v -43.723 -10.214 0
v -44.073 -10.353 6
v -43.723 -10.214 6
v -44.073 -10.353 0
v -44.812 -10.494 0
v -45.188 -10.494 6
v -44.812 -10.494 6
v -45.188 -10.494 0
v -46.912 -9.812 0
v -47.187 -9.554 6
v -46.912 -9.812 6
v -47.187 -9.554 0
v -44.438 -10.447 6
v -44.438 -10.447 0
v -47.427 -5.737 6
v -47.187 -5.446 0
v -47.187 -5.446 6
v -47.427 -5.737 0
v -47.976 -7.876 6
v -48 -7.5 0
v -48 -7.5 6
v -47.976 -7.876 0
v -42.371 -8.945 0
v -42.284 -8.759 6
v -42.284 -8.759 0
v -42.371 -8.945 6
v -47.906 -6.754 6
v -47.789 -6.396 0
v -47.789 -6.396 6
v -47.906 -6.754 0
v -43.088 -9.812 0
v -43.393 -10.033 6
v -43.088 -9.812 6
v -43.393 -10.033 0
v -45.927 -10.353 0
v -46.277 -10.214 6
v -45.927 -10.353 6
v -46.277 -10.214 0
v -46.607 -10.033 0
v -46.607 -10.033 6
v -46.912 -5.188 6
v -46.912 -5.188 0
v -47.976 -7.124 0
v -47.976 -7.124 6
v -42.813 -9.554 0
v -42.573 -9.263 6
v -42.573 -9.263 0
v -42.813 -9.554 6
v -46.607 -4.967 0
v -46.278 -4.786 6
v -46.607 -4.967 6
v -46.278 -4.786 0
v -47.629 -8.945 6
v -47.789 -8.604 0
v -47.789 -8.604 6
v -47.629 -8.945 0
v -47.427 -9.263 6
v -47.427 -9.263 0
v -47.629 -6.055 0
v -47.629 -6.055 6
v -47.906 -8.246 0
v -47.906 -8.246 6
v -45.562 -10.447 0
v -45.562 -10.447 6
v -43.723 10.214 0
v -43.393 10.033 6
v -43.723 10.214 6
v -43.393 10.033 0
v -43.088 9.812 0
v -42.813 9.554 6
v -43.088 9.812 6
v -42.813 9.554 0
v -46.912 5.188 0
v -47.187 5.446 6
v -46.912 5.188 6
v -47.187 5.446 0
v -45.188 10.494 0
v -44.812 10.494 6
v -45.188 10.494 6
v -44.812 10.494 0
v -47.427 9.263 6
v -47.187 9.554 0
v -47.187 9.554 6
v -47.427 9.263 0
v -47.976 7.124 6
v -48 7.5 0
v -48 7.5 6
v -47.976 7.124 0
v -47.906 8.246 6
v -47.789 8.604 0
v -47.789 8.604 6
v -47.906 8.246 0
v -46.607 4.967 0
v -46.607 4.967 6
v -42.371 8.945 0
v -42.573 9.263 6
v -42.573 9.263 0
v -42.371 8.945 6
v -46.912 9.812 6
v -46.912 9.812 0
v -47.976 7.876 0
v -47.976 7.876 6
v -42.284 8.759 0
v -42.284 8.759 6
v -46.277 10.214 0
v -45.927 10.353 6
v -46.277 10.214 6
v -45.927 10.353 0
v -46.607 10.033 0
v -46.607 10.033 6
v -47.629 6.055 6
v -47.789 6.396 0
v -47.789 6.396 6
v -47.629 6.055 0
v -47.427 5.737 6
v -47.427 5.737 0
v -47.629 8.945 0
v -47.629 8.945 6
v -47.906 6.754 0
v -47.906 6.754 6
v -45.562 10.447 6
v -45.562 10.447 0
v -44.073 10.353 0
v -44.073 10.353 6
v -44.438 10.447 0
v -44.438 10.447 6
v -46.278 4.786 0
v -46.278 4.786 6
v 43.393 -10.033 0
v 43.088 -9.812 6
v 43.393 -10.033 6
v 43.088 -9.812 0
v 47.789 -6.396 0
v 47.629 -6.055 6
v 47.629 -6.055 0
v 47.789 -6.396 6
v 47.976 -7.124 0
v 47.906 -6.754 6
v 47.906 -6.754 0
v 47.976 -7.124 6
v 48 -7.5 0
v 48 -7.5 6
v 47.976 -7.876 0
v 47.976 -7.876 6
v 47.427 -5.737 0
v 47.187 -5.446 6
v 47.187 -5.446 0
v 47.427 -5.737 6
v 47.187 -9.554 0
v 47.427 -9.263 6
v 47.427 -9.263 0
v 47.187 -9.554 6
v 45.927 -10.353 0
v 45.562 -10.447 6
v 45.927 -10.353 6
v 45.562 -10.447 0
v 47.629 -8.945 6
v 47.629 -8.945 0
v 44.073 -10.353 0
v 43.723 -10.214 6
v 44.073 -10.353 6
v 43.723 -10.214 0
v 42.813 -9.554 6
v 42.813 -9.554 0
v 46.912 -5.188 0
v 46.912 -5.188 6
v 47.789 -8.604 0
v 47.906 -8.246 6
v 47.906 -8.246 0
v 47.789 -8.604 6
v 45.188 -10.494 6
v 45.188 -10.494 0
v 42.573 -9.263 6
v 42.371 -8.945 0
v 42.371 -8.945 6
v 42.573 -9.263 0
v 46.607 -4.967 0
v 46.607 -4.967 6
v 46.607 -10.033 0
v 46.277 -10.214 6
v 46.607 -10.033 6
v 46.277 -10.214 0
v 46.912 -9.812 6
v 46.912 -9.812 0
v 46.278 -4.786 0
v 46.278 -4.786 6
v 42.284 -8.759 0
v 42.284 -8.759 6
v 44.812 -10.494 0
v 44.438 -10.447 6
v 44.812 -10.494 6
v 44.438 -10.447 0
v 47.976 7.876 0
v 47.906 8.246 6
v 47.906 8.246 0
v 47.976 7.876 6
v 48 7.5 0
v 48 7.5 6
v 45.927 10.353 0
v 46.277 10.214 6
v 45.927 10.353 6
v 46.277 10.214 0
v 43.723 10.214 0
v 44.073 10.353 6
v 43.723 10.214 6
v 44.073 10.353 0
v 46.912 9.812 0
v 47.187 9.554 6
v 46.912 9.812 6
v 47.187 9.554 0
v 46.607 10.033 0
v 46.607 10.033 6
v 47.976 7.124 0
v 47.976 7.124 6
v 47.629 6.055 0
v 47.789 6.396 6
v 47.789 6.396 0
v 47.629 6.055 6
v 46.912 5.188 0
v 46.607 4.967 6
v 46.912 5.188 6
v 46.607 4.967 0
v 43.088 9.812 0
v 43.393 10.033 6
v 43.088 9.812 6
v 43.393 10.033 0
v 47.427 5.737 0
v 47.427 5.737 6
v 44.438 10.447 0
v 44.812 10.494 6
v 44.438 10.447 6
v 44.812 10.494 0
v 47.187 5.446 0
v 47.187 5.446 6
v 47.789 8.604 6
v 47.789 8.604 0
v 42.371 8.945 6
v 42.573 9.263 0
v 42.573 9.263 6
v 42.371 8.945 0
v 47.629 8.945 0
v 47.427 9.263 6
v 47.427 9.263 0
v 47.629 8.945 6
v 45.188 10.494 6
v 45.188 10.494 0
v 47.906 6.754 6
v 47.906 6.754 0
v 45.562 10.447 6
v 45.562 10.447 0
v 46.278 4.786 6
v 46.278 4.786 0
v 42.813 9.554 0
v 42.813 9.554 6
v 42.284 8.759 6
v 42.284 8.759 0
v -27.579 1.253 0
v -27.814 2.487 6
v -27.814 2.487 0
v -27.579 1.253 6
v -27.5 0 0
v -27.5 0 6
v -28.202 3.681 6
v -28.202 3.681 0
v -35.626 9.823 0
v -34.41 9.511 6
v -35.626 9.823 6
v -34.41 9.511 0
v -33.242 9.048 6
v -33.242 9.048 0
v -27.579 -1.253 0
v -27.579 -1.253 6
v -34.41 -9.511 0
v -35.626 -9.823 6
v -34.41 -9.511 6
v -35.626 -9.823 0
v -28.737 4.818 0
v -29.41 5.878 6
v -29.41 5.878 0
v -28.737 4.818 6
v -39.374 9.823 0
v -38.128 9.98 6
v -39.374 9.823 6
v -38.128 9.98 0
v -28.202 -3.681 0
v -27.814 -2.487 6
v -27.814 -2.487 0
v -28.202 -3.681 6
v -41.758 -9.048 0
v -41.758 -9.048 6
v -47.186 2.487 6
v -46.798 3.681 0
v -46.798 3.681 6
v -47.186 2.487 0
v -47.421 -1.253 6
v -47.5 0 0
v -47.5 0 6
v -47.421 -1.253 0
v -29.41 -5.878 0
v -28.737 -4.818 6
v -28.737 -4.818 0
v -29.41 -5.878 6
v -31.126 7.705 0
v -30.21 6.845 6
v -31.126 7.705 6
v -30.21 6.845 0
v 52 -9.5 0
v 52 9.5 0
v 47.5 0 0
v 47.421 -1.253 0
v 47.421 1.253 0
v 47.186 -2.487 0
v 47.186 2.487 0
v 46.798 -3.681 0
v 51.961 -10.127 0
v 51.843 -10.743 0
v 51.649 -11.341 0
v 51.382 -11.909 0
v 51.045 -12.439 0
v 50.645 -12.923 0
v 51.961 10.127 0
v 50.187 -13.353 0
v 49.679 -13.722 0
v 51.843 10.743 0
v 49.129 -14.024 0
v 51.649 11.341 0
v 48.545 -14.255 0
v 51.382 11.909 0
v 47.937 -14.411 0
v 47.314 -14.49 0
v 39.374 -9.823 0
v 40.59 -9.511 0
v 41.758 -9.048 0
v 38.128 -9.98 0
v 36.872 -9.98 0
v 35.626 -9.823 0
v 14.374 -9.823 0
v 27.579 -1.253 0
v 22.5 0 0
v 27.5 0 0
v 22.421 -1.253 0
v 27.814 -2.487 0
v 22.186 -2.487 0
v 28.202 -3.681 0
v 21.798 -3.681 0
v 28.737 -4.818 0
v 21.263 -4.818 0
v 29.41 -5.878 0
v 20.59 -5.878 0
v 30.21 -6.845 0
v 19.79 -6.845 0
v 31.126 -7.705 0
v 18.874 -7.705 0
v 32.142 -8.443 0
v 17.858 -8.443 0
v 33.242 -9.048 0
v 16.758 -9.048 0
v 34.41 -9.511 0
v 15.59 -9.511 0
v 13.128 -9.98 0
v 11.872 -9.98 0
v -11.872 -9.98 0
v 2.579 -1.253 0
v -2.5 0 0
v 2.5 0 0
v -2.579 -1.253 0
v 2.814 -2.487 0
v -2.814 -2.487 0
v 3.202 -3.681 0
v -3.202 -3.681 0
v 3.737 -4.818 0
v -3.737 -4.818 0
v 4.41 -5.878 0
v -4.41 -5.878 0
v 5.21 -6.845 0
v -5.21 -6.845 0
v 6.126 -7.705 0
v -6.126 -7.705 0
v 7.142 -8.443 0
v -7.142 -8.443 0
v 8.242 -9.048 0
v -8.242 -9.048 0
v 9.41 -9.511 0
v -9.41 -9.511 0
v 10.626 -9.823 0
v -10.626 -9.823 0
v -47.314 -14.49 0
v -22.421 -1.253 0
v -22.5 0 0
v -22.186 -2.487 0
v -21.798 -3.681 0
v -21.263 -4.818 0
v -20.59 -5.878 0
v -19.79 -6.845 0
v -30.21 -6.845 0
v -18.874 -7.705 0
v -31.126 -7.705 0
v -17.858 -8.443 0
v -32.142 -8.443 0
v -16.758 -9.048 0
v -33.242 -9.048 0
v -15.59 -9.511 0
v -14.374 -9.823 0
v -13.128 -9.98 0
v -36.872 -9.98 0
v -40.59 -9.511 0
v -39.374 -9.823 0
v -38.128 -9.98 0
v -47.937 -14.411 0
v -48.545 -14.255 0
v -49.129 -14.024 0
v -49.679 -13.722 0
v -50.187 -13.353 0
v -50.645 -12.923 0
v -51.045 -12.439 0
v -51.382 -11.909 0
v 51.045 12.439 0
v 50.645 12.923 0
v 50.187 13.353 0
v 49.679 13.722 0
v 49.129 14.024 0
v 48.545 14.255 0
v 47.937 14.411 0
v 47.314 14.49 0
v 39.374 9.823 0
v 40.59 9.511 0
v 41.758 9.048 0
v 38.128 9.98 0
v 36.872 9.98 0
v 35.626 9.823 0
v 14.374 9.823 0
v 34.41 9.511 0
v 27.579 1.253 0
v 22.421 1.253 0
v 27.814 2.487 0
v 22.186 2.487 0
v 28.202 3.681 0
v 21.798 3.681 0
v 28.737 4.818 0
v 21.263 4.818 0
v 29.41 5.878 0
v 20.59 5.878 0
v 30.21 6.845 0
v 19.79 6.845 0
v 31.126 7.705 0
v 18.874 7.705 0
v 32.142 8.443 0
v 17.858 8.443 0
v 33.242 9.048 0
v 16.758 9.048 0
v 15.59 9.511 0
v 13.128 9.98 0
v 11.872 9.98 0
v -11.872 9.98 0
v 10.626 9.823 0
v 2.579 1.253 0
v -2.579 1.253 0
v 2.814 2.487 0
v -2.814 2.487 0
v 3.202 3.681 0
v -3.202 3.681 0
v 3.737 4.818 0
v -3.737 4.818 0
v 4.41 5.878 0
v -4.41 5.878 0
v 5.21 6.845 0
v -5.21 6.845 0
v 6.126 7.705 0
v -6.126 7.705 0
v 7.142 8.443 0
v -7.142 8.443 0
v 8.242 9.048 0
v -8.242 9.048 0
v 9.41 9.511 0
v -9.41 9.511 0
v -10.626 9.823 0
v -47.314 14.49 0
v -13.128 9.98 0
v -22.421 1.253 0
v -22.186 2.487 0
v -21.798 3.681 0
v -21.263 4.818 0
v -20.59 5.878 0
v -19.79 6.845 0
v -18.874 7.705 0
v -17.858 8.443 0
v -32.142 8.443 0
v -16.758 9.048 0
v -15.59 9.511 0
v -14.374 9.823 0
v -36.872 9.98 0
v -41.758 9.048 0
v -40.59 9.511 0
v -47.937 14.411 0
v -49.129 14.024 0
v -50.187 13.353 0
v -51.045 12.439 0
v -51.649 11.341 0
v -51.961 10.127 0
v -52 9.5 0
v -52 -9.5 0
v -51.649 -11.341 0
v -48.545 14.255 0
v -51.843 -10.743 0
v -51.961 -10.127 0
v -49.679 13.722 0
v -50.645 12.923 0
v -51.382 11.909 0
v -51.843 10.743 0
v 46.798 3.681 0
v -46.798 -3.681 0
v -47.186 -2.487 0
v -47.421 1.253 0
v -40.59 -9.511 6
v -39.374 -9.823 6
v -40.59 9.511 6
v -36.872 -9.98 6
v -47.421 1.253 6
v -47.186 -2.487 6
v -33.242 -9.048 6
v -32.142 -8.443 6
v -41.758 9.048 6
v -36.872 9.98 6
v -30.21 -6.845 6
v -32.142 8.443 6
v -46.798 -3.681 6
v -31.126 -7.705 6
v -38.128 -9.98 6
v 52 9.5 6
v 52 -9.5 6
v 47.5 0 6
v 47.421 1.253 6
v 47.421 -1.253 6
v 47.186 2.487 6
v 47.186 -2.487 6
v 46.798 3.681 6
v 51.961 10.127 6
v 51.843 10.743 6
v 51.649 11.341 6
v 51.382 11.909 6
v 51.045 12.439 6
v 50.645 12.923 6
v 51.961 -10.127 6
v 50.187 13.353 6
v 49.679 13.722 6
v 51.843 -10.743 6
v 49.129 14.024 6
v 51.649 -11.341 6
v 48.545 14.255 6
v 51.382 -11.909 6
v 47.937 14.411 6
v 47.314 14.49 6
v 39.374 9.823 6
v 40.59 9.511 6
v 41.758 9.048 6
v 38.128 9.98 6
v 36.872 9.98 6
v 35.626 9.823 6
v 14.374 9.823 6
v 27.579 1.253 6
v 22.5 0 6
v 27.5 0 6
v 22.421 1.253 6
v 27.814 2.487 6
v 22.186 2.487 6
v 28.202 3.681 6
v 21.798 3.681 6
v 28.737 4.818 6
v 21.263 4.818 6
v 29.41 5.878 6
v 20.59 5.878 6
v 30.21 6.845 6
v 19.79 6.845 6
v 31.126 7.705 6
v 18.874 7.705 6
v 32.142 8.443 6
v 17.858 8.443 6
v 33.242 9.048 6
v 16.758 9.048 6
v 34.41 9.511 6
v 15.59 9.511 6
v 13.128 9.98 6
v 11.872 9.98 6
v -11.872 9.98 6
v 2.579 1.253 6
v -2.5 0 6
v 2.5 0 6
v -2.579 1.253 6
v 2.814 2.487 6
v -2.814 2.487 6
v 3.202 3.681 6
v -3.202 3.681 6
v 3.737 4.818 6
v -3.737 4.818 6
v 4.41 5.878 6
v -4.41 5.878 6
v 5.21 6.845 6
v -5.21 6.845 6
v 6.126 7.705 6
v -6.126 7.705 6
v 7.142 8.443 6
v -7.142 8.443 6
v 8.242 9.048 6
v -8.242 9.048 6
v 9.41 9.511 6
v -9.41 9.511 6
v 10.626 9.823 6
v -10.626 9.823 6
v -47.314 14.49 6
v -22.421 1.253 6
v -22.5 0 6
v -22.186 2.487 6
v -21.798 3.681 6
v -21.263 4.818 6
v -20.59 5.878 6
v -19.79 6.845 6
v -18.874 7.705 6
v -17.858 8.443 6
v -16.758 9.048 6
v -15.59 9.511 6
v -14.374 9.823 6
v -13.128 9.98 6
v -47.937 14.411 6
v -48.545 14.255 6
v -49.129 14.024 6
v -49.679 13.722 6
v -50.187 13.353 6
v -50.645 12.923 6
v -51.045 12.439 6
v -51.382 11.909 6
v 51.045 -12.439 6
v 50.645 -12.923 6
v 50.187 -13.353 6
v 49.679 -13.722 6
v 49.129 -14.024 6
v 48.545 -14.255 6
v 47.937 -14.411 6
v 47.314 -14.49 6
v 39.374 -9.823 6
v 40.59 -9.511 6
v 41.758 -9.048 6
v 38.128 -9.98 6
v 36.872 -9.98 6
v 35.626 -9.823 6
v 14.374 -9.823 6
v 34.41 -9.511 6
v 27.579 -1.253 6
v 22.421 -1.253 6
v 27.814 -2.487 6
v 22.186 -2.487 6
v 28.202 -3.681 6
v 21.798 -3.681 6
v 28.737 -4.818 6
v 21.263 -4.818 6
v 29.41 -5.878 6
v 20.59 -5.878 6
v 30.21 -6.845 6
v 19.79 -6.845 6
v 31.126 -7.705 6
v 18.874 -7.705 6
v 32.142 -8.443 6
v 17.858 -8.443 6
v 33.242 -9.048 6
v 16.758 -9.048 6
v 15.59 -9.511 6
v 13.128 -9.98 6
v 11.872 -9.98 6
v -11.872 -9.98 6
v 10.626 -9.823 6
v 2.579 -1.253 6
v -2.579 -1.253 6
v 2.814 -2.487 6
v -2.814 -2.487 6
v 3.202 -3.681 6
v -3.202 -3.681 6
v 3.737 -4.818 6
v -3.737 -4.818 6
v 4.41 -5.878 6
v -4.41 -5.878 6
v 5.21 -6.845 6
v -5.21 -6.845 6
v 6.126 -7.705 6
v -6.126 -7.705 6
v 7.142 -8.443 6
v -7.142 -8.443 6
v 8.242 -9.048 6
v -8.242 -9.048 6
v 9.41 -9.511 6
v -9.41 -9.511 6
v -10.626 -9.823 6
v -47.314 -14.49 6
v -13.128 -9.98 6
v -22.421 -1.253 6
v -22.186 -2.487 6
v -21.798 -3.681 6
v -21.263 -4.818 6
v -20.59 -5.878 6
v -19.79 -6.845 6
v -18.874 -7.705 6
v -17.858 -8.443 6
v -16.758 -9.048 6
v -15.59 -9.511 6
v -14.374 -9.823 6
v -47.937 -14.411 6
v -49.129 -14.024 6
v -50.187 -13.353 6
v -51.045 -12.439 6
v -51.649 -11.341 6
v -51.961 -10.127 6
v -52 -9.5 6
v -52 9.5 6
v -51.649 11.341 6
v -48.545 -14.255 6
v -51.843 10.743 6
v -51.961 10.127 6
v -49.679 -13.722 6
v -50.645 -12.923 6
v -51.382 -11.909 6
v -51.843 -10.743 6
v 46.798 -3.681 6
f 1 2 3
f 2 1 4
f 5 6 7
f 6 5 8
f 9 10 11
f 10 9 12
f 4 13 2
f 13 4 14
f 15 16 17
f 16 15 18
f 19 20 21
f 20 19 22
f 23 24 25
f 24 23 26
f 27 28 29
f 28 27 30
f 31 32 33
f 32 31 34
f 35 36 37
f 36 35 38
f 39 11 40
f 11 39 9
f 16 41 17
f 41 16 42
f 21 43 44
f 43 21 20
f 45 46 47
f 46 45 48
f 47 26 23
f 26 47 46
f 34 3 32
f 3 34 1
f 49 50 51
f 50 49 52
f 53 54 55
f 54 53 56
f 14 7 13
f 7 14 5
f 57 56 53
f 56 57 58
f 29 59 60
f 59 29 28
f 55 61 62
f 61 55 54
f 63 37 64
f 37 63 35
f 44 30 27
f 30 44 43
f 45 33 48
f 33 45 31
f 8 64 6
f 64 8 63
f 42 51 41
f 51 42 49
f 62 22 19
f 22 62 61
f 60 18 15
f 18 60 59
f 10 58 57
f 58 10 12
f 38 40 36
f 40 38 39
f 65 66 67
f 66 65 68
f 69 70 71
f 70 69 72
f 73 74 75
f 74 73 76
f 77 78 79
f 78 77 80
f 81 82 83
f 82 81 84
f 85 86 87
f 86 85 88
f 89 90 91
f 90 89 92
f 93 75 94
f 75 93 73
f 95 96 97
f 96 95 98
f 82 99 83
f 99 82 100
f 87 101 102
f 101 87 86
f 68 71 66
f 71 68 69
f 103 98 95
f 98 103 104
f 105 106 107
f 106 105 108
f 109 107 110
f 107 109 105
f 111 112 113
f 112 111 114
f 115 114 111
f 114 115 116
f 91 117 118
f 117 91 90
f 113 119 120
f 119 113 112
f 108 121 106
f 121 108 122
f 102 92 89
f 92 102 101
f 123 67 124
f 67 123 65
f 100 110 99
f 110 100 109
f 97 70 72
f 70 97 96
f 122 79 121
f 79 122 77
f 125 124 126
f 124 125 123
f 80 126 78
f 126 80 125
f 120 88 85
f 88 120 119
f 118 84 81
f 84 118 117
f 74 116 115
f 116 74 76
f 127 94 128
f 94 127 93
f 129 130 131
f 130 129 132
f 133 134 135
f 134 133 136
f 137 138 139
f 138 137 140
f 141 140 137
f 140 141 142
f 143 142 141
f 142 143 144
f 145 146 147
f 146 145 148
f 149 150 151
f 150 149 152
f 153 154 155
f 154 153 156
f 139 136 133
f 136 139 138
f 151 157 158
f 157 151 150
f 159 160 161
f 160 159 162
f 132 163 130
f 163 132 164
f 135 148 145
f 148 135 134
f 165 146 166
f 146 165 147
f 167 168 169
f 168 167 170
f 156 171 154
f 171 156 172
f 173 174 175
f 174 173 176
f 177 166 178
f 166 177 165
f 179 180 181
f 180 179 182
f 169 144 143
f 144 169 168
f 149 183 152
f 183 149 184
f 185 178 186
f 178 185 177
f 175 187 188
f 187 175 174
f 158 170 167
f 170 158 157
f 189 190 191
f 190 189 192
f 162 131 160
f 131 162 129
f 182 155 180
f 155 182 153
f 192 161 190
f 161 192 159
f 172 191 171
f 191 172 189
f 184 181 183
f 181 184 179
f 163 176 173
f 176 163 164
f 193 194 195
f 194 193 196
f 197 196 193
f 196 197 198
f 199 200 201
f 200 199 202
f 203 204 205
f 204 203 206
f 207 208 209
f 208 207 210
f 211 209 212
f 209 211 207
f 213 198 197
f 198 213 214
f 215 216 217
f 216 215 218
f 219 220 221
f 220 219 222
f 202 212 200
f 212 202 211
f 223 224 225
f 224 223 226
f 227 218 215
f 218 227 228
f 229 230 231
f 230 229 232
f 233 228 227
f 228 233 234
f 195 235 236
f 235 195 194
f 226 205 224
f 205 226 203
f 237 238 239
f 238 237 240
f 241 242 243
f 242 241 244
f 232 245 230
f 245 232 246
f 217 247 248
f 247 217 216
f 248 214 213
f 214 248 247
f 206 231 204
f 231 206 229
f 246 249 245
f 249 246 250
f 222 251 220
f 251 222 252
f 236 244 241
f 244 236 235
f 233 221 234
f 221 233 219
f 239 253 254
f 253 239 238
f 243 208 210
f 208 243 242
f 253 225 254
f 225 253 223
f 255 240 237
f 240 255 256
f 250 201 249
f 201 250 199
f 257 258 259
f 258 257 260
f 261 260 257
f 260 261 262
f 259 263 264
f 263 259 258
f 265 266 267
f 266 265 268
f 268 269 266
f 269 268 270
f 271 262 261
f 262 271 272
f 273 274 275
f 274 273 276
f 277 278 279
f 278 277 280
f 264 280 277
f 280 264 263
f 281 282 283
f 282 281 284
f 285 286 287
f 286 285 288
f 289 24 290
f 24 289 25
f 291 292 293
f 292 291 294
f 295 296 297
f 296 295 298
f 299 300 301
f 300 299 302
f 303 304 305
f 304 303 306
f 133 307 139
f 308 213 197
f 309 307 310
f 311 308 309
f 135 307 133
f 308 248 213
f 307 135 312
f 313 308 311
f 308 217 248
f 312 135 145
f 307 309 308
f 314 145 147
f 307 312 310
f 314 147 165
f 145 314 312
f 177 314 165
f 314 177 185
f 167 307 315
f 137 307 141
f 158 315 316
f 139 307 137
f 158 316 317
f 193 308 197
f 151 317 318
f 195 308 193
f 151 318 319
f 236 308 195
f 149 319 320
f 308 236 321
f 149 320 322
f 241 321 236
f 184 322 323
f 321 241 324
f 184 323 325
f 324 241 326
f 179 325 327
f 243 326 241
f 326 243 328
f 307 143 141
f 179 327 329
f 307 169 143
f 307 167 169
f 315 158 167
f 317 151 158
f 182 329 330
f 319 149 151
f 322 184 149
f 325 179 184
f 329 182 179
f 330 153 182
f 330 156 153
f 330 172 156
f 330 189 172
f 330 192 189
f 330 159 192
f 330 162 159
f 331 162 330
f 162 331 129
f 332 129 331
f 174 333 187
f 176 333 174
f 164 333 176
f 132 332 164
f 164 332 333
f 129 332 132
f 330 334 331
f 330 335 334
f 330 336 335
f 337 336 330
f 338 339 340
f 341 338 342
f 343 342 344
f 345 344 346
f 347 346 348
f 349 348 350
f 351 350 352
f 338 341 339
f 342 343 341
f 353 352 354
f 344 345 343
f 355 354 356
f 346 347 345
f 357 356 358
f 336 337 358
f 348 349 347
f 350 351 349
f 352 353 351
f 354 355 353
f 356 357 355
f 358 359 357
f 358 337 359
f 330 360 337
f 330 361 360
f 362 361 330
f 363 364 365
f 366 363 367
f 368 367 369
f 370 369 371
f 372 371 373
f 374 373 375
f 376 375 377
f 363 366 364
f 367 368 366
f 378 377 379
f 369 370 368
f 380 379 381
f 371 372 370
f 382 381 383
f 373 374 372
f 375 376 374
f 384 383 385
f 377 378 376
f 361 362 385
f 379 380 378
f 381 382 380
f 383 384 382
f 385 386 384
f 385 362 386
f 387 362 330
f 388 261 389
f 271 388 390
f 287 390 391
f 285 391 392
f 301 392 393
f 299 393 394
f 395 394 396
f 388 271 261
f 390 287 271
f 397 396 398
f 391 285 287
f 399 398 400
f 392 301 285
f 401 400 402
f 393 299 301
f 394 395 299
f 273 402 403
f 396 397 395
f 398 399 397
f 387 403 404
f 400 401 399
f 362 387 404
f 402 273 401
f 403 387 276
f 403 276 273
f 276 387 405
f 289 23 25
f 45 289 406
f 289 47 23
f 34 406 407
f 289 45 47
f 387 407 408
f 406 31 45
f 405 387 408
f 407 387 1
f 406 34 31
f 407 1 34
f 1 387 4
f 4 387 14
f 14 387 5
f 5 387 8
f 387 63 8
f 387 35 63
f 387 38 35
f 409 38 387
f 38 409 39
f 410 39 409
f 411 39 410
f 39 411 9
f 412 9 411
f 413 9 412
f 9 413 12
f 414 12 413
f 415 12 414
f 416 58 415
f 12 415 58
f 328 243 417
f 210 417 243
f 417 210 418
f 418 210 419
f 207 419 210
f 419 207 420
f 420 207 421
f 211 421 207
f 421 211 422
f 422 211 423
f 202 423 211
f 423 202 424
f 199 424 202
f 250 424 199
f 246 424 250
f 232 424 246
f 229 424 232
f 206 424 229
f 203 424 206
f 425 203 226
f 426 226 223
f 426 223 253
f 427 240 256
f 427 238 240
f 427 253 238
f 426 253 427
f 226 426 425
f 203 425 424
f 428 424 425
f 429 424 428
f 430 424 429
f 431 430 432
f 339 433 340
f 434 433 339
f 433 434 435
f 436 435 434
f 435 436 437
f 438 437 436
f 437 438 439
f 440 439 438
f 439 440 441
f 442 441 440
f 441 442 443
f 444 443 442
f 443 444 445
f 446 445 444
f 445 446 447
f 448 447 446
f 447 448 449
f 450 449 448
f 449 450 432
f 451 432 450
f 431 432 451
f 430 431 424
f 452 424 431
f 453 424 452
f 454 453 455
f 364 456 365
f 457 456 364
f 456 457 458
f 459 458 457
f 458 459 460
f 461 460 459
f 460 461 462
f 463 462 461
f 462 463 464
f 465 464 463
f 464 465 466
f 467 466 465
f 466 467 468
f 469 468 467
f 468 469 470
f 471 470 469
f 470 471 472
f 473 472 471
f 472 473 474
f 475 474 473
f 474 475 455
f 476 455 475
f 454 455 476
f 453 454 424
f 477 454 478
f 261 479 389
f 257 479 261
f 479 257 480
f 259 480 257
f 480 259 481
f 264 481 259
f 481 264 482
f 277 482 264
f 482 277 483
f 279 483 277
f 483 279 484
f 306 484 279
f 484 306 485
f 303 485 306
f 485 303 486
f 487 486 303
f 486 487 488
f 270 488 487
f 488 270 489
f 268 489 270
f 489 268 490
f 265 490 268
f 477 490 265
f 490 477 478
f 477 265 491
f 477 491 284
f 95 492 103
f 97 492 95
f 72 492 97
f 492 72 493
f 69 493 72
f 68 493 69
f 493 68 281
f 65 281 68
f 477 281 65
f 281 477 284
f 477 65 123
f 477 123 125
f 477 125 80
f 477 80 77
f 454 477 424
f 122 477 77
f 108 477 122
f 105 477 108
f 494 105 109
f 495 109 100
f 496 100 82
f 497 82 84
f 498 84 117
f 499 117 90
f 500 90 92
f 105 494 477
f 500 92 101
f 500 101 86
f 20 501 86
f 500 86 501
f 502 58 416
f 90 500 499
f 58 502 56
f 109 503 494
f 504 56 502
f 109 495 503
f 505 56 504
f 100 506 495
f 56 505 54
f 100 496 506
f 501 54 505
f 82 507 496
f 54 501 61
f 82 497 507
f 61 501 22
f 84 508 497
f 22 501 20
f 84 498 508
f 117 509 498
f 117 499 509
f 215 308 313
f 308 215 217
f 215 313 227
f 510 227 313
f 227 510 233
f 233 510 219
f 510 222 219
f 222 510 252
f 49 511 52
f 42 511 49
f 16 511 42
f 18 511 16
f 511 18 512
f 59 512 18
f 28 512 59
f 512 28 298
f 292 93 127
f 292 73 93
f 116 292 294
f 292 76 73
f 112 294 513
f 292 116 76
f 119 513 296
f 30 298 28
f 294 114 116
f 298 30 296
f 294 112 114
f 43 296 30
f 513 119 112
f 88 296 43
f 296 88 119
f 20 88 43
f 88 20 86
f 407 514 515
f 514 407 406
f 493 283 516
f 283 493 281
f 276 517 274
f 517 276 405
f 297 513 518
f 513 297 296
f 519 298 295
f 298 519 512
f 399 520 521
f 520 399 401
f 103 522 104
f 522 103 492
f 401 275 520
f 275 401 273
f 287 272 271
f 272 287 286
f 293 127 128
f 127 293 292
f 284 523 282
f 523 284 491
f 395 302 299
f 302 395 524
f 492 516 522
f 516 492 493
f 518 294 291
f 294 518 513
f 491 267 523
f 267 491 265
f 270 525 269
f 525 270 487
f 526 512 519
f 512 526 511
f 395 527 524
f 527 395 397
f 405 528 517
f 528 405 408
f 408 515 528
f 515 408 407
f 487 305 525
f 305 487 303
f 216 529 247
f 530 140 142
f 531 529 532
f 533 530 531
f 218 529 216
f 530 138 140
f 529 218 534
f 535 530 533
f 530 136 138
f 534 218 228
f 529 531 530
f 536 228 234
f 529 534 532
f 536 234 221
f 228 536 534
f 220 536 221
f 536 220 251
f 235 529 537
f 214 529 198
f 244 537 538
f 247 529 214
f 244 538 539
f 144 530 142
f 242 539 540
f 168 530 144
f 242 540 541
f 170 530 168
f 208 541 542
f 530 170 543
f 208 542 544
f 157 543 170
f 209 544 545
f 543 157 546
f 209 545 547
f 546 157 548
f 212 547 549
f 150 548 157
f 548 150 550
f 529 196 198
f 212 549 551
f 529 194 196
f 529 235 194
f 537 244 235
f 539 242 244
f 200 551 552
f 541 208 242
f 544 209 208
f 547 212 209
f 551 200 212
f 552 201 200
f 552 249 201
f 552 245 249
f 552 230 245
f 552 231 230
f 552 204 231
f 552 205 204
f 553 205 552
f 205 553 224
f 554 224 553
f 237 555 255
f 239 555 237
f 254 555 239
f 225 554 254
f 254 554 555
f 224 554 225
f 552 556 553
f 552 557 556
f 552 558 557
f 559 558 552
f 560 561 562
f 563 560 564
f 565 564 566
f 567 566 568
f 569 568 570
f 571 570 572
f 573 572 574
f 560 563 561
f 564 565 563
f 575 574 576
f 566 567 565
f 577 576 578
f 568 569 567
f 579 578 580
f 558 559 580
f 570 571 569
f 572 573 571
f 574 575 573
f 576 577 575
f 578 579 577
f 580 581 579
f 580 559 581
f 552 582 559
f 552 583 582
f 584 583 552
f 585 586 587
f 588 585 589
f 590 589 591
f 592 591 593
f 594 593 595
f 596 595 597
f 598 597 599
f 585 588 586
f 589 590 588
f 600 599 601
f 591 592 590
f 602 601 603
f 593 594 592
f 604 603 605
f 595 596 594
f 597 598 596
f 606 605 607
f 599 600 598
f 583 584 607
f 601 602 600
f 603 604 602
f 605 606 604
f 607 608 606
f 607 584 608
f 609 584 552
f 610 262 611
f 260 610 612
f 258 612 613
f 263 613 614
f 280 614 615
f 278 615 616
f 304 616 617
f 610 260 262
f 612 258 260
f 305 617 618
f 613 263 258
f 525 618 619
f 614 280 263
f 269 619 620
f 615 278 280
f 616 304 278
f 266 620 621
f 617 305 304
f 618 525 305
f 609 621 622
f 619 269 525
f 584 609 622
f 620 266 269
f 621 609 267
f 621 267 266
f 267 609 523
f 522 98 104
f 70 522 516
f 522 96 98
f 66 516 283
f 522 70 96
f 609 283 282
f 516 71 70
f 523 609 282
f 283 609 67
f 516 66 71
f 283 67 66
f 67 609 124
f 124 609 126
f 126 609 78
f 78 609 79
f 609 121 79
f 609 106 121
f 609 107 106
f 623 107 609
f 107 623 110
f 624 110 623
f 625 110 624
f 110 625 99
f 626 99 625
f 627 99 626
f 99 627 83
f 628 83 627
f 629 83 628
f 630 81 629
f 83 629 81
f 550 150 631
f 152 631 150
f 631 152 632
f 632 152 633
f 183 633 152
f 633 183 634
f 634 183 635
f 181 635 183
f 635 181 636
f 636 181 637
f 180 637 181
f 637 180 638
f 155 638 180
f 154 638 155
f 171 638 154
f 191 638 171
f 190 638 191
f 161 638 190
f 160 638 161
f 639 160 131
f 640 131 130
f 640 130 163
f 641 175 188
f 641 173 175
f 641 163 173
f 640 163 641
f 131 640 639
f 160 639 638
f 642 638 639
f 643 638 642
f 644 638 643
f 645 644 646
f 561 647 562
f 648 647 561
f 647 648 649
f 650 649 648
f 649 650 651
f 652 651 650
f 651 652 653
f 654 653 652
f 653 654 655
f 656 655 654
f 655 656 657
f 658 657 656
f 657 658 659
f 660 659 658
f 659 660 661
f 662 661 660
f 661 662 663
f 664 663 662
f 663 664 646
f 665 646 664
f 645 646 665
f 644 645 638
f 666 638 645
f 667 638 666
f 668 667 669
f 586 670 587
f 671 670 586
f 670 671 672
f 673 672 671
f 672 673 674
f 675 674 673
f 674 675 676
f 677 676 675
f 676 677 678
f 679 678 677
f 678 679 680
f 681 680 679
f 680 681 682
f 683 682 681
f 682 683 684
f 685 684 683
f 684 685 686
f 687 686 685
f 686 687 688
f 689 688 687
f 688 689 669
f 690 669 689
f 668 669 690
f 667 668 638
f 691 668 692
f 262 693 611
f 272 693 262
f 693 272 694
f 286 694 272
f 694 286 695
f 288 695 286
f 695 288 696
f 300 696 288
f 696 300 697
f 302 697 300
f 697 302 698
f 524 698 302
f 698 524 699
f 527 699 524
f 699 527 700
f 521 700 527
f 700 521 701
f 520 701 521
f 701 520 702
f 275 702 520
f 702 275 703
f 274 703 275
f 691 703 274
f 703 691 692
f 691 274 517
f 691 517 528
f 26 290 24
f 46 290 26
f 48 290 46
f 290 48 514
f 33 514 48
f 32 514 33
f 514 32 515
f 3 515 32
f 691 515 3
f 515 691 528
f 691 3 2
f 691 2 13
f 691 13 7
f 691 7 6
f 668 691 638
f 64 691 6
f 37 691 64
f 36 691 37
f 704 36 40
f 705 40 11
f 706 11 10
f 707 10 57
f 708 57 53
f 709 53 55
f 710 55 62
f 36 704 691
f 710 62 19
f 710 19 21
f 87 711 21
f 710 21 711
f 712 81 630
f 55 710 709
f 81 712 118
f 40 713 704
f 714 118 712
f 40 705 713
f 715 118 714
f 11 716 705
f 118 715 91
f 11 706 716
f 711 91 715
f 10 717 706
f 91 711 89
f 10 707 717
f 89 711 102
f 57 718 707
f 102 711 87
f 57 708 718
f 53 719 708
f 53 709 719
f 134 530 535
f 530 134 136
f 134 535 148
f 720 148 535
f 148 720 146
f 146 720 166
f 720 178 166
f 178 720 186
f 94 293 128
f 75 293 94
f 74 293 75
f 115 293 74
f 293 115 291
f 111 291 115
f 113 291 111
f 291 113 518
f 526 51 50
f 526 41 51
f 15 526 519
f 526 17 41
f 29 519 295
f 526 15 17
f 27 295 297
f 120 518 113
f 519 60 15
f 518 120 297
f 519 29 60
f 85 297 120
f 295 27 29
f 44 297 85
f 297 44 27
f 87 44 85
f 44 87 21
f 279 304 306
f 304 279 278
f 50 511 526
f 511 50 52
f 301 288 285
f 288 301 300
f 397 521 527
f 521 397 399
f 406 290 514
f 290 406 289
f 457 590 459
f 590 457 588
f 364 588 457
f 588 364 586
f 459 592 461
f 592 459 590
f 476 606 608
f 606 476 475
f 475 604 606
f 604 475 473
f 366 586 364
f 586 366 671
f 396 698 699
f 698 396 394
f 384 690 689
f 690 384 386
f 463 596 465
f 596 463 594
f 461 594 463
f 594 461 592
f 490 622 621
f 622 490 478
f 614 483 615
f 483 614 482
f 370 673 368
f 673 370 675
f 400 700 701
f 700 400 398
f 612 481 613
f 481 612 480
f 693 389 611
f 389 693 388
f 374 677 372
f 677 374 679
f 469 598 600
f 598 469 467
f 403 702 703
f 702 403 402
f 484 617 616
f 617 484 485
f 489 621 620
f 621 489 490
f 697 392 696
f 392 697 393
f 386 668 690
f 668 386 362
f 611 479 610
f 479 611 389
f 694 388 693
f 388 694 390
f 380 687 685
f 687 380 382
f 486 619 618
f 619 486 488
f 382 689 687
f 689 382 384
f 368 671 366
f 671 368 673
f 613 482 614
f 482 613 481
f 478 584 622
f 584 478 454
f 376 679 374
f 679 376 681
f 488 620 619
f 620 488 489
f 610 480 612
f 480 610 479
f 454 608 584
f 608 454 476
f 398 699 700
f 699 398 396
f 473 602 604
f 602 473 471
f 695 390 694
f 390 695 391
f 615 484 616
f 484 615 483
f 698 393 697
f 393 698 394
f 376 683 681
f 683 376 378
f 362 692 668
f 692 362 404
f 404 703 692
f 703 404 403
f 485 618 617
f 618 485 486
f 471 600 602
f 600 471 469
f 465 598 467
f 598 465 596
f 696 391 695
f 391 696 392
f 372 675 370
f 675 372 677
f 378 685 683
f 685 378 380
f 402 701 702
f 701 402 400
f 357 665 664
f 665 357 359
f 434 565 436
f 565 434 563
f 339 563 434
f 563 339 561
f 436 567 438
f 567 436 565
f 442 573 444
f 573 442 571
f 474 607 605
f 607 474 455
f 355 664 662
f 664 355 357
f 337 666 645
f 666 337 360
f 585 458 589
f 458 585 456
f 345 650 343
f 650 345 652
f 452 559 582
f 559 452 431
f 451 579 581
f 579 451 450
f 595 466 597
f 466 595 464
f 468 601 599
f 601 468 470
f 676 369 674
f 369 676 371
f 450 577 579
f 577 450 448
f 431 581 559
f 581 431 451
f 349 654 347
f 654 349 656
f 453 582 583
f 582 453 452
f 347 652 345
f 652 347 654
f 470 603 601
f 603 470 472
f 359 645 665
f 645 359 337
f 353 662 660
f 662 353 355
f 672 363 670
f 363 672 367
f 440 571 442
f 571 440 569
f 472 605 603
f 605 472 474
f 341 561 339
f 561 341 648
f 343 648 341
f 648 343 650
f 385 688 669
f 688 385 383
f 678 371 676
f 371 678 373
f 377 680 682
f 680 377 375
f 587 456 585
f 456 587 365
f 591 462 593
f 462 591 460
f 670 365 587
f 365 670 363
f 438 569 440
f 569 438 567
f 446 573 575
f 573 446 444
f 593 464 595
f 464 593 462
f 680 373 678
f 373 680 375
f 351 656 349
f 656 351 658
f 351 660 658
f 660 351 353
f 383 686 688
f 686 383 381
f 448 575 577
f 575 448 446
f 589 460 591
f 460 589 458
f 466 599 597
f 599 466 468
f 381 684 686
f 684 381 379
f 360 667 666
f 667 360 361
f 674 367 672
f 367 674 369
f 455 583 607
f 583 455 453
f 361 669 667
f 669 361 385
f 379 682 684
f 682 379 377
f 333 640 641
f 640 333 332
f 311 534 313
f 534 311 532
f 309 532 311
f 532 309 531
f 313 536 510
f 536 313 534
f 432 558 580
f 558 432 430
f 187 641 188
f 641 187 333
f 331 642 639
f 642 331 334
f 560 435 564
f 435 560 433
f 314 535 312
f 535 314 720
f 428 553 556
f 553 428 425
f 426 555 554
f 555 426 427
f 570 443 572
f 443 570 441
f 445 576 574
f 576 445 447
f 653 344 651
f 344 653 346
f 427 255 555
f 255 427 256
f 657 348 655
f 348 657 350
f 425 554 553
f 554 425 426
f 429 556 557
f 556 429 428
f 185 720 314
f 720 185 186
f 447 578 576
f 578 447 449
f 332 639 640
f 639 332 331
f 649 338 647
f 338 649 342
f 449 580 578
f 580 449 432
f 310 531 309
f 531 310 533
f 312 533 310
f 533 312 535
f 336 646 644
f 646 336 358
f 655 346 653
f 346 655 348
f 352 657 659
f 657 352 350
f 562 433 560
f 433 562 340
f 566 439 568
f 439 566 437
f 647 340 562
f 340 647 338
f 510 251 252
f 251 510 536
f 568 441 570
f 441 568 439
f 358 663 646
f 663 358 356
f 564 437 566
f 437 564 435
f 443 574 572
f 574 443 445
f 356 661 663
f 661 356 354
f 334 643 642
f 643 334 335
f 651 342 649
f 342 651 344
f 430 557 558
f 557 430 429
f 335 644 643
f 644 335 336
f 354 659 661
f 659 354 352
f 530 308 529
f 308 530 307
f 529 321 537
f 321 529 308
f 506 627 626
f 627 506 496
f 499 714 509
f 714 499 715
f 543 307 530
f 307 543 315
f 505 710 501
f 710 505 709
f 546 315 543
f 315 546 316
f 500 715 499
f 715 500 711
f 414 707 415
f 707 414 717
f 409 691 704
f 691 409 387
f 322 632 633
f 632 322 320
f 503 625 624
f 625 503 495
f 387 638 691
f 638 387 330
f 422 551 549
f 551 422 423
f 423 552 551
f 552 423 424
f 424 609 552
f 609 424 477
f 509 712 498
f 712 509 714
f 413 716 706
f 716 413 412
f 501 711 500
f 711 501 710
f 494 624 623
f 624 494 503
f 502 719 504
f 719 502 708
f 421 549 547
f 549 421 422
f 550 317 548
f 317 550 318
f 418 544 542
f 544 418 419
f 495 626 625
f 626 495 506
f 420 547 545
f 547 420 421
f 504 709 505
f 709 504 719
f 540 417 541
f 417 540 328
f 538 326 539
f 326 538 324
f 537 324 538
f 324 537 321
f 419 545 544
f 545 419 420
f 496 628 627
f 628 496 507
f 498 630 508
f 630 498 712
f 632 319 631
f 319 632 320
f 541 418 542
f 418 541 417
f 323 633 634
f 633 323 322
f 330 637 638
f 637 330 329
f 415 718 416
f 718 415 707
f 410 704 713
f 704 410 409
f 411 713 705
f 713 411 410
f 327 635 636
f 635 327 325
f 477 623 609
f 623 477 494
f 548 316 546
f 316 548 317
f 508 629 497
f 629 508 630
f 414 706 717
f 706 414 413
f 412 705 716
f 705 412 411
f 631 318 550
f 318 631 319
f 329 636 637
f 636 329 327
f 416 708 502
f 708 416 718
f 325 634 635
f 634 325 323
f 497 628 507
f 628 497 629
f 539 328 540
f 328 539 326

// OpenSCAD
$fn = 50;


difference() {
	union() {
		hull() {
			translate(v = [-47.0000000000, 9.5000000000, 0]) {
				cylinder(h = 6, r = 5);
			}
			translate(v = [47.0000000000, 9.5000000000, 0]) {
				cylinder(h = 6, r = 5);
			}
			translate(v = [-47.0000000000, -9.5000000000, 0]) {
				cylinder(h = 6, r = 5);
			}
			translate(v = [47.0000000000, -9.5000000000, 0]) {
				cylinder(h = 6, r = 5);
			}
		}
	}
	union() {
		#translate(v = [-45.0000000000, -7.5000000000, -100.0000000000]) {
			cylinder(h = 200, r = 3.0000000000);
		}
		#translate(v = [-45.0000000000, 7.5000000000, -100.0000000000]) {
			cylinder(h = 200, r = 3.0000000000);
		}
		#translate(v = [45.0000000000, -7.5000000000, -100.0000000000]) {
			cylinder(h = 200, r = 3.0000000000);
		}
		#translate(v = [45.0000000000, 7.5000000000, -100.0000000000]) {
			cylinder(h = 200, r = 3.0000000000);
		}
		#translate(v = [-37.5000000000, 0, 0]) {
			cylinder(h = 6, r = 10.0000000000);
		}
		#translate(v = [-12.5000000000, 0, 0]) {
			cylinder(h = 6, r = 10.0000000000);
		}
		#translate(v = [12.5000000000, 0, 0]) {
			cylinder(h = 6, r = 10.0000000000);
		}
		#translate(v = [37.5000000000, 0, 0]) {
			cylinder(h = 6, r = 10.0000000000);
		}
	}
}
